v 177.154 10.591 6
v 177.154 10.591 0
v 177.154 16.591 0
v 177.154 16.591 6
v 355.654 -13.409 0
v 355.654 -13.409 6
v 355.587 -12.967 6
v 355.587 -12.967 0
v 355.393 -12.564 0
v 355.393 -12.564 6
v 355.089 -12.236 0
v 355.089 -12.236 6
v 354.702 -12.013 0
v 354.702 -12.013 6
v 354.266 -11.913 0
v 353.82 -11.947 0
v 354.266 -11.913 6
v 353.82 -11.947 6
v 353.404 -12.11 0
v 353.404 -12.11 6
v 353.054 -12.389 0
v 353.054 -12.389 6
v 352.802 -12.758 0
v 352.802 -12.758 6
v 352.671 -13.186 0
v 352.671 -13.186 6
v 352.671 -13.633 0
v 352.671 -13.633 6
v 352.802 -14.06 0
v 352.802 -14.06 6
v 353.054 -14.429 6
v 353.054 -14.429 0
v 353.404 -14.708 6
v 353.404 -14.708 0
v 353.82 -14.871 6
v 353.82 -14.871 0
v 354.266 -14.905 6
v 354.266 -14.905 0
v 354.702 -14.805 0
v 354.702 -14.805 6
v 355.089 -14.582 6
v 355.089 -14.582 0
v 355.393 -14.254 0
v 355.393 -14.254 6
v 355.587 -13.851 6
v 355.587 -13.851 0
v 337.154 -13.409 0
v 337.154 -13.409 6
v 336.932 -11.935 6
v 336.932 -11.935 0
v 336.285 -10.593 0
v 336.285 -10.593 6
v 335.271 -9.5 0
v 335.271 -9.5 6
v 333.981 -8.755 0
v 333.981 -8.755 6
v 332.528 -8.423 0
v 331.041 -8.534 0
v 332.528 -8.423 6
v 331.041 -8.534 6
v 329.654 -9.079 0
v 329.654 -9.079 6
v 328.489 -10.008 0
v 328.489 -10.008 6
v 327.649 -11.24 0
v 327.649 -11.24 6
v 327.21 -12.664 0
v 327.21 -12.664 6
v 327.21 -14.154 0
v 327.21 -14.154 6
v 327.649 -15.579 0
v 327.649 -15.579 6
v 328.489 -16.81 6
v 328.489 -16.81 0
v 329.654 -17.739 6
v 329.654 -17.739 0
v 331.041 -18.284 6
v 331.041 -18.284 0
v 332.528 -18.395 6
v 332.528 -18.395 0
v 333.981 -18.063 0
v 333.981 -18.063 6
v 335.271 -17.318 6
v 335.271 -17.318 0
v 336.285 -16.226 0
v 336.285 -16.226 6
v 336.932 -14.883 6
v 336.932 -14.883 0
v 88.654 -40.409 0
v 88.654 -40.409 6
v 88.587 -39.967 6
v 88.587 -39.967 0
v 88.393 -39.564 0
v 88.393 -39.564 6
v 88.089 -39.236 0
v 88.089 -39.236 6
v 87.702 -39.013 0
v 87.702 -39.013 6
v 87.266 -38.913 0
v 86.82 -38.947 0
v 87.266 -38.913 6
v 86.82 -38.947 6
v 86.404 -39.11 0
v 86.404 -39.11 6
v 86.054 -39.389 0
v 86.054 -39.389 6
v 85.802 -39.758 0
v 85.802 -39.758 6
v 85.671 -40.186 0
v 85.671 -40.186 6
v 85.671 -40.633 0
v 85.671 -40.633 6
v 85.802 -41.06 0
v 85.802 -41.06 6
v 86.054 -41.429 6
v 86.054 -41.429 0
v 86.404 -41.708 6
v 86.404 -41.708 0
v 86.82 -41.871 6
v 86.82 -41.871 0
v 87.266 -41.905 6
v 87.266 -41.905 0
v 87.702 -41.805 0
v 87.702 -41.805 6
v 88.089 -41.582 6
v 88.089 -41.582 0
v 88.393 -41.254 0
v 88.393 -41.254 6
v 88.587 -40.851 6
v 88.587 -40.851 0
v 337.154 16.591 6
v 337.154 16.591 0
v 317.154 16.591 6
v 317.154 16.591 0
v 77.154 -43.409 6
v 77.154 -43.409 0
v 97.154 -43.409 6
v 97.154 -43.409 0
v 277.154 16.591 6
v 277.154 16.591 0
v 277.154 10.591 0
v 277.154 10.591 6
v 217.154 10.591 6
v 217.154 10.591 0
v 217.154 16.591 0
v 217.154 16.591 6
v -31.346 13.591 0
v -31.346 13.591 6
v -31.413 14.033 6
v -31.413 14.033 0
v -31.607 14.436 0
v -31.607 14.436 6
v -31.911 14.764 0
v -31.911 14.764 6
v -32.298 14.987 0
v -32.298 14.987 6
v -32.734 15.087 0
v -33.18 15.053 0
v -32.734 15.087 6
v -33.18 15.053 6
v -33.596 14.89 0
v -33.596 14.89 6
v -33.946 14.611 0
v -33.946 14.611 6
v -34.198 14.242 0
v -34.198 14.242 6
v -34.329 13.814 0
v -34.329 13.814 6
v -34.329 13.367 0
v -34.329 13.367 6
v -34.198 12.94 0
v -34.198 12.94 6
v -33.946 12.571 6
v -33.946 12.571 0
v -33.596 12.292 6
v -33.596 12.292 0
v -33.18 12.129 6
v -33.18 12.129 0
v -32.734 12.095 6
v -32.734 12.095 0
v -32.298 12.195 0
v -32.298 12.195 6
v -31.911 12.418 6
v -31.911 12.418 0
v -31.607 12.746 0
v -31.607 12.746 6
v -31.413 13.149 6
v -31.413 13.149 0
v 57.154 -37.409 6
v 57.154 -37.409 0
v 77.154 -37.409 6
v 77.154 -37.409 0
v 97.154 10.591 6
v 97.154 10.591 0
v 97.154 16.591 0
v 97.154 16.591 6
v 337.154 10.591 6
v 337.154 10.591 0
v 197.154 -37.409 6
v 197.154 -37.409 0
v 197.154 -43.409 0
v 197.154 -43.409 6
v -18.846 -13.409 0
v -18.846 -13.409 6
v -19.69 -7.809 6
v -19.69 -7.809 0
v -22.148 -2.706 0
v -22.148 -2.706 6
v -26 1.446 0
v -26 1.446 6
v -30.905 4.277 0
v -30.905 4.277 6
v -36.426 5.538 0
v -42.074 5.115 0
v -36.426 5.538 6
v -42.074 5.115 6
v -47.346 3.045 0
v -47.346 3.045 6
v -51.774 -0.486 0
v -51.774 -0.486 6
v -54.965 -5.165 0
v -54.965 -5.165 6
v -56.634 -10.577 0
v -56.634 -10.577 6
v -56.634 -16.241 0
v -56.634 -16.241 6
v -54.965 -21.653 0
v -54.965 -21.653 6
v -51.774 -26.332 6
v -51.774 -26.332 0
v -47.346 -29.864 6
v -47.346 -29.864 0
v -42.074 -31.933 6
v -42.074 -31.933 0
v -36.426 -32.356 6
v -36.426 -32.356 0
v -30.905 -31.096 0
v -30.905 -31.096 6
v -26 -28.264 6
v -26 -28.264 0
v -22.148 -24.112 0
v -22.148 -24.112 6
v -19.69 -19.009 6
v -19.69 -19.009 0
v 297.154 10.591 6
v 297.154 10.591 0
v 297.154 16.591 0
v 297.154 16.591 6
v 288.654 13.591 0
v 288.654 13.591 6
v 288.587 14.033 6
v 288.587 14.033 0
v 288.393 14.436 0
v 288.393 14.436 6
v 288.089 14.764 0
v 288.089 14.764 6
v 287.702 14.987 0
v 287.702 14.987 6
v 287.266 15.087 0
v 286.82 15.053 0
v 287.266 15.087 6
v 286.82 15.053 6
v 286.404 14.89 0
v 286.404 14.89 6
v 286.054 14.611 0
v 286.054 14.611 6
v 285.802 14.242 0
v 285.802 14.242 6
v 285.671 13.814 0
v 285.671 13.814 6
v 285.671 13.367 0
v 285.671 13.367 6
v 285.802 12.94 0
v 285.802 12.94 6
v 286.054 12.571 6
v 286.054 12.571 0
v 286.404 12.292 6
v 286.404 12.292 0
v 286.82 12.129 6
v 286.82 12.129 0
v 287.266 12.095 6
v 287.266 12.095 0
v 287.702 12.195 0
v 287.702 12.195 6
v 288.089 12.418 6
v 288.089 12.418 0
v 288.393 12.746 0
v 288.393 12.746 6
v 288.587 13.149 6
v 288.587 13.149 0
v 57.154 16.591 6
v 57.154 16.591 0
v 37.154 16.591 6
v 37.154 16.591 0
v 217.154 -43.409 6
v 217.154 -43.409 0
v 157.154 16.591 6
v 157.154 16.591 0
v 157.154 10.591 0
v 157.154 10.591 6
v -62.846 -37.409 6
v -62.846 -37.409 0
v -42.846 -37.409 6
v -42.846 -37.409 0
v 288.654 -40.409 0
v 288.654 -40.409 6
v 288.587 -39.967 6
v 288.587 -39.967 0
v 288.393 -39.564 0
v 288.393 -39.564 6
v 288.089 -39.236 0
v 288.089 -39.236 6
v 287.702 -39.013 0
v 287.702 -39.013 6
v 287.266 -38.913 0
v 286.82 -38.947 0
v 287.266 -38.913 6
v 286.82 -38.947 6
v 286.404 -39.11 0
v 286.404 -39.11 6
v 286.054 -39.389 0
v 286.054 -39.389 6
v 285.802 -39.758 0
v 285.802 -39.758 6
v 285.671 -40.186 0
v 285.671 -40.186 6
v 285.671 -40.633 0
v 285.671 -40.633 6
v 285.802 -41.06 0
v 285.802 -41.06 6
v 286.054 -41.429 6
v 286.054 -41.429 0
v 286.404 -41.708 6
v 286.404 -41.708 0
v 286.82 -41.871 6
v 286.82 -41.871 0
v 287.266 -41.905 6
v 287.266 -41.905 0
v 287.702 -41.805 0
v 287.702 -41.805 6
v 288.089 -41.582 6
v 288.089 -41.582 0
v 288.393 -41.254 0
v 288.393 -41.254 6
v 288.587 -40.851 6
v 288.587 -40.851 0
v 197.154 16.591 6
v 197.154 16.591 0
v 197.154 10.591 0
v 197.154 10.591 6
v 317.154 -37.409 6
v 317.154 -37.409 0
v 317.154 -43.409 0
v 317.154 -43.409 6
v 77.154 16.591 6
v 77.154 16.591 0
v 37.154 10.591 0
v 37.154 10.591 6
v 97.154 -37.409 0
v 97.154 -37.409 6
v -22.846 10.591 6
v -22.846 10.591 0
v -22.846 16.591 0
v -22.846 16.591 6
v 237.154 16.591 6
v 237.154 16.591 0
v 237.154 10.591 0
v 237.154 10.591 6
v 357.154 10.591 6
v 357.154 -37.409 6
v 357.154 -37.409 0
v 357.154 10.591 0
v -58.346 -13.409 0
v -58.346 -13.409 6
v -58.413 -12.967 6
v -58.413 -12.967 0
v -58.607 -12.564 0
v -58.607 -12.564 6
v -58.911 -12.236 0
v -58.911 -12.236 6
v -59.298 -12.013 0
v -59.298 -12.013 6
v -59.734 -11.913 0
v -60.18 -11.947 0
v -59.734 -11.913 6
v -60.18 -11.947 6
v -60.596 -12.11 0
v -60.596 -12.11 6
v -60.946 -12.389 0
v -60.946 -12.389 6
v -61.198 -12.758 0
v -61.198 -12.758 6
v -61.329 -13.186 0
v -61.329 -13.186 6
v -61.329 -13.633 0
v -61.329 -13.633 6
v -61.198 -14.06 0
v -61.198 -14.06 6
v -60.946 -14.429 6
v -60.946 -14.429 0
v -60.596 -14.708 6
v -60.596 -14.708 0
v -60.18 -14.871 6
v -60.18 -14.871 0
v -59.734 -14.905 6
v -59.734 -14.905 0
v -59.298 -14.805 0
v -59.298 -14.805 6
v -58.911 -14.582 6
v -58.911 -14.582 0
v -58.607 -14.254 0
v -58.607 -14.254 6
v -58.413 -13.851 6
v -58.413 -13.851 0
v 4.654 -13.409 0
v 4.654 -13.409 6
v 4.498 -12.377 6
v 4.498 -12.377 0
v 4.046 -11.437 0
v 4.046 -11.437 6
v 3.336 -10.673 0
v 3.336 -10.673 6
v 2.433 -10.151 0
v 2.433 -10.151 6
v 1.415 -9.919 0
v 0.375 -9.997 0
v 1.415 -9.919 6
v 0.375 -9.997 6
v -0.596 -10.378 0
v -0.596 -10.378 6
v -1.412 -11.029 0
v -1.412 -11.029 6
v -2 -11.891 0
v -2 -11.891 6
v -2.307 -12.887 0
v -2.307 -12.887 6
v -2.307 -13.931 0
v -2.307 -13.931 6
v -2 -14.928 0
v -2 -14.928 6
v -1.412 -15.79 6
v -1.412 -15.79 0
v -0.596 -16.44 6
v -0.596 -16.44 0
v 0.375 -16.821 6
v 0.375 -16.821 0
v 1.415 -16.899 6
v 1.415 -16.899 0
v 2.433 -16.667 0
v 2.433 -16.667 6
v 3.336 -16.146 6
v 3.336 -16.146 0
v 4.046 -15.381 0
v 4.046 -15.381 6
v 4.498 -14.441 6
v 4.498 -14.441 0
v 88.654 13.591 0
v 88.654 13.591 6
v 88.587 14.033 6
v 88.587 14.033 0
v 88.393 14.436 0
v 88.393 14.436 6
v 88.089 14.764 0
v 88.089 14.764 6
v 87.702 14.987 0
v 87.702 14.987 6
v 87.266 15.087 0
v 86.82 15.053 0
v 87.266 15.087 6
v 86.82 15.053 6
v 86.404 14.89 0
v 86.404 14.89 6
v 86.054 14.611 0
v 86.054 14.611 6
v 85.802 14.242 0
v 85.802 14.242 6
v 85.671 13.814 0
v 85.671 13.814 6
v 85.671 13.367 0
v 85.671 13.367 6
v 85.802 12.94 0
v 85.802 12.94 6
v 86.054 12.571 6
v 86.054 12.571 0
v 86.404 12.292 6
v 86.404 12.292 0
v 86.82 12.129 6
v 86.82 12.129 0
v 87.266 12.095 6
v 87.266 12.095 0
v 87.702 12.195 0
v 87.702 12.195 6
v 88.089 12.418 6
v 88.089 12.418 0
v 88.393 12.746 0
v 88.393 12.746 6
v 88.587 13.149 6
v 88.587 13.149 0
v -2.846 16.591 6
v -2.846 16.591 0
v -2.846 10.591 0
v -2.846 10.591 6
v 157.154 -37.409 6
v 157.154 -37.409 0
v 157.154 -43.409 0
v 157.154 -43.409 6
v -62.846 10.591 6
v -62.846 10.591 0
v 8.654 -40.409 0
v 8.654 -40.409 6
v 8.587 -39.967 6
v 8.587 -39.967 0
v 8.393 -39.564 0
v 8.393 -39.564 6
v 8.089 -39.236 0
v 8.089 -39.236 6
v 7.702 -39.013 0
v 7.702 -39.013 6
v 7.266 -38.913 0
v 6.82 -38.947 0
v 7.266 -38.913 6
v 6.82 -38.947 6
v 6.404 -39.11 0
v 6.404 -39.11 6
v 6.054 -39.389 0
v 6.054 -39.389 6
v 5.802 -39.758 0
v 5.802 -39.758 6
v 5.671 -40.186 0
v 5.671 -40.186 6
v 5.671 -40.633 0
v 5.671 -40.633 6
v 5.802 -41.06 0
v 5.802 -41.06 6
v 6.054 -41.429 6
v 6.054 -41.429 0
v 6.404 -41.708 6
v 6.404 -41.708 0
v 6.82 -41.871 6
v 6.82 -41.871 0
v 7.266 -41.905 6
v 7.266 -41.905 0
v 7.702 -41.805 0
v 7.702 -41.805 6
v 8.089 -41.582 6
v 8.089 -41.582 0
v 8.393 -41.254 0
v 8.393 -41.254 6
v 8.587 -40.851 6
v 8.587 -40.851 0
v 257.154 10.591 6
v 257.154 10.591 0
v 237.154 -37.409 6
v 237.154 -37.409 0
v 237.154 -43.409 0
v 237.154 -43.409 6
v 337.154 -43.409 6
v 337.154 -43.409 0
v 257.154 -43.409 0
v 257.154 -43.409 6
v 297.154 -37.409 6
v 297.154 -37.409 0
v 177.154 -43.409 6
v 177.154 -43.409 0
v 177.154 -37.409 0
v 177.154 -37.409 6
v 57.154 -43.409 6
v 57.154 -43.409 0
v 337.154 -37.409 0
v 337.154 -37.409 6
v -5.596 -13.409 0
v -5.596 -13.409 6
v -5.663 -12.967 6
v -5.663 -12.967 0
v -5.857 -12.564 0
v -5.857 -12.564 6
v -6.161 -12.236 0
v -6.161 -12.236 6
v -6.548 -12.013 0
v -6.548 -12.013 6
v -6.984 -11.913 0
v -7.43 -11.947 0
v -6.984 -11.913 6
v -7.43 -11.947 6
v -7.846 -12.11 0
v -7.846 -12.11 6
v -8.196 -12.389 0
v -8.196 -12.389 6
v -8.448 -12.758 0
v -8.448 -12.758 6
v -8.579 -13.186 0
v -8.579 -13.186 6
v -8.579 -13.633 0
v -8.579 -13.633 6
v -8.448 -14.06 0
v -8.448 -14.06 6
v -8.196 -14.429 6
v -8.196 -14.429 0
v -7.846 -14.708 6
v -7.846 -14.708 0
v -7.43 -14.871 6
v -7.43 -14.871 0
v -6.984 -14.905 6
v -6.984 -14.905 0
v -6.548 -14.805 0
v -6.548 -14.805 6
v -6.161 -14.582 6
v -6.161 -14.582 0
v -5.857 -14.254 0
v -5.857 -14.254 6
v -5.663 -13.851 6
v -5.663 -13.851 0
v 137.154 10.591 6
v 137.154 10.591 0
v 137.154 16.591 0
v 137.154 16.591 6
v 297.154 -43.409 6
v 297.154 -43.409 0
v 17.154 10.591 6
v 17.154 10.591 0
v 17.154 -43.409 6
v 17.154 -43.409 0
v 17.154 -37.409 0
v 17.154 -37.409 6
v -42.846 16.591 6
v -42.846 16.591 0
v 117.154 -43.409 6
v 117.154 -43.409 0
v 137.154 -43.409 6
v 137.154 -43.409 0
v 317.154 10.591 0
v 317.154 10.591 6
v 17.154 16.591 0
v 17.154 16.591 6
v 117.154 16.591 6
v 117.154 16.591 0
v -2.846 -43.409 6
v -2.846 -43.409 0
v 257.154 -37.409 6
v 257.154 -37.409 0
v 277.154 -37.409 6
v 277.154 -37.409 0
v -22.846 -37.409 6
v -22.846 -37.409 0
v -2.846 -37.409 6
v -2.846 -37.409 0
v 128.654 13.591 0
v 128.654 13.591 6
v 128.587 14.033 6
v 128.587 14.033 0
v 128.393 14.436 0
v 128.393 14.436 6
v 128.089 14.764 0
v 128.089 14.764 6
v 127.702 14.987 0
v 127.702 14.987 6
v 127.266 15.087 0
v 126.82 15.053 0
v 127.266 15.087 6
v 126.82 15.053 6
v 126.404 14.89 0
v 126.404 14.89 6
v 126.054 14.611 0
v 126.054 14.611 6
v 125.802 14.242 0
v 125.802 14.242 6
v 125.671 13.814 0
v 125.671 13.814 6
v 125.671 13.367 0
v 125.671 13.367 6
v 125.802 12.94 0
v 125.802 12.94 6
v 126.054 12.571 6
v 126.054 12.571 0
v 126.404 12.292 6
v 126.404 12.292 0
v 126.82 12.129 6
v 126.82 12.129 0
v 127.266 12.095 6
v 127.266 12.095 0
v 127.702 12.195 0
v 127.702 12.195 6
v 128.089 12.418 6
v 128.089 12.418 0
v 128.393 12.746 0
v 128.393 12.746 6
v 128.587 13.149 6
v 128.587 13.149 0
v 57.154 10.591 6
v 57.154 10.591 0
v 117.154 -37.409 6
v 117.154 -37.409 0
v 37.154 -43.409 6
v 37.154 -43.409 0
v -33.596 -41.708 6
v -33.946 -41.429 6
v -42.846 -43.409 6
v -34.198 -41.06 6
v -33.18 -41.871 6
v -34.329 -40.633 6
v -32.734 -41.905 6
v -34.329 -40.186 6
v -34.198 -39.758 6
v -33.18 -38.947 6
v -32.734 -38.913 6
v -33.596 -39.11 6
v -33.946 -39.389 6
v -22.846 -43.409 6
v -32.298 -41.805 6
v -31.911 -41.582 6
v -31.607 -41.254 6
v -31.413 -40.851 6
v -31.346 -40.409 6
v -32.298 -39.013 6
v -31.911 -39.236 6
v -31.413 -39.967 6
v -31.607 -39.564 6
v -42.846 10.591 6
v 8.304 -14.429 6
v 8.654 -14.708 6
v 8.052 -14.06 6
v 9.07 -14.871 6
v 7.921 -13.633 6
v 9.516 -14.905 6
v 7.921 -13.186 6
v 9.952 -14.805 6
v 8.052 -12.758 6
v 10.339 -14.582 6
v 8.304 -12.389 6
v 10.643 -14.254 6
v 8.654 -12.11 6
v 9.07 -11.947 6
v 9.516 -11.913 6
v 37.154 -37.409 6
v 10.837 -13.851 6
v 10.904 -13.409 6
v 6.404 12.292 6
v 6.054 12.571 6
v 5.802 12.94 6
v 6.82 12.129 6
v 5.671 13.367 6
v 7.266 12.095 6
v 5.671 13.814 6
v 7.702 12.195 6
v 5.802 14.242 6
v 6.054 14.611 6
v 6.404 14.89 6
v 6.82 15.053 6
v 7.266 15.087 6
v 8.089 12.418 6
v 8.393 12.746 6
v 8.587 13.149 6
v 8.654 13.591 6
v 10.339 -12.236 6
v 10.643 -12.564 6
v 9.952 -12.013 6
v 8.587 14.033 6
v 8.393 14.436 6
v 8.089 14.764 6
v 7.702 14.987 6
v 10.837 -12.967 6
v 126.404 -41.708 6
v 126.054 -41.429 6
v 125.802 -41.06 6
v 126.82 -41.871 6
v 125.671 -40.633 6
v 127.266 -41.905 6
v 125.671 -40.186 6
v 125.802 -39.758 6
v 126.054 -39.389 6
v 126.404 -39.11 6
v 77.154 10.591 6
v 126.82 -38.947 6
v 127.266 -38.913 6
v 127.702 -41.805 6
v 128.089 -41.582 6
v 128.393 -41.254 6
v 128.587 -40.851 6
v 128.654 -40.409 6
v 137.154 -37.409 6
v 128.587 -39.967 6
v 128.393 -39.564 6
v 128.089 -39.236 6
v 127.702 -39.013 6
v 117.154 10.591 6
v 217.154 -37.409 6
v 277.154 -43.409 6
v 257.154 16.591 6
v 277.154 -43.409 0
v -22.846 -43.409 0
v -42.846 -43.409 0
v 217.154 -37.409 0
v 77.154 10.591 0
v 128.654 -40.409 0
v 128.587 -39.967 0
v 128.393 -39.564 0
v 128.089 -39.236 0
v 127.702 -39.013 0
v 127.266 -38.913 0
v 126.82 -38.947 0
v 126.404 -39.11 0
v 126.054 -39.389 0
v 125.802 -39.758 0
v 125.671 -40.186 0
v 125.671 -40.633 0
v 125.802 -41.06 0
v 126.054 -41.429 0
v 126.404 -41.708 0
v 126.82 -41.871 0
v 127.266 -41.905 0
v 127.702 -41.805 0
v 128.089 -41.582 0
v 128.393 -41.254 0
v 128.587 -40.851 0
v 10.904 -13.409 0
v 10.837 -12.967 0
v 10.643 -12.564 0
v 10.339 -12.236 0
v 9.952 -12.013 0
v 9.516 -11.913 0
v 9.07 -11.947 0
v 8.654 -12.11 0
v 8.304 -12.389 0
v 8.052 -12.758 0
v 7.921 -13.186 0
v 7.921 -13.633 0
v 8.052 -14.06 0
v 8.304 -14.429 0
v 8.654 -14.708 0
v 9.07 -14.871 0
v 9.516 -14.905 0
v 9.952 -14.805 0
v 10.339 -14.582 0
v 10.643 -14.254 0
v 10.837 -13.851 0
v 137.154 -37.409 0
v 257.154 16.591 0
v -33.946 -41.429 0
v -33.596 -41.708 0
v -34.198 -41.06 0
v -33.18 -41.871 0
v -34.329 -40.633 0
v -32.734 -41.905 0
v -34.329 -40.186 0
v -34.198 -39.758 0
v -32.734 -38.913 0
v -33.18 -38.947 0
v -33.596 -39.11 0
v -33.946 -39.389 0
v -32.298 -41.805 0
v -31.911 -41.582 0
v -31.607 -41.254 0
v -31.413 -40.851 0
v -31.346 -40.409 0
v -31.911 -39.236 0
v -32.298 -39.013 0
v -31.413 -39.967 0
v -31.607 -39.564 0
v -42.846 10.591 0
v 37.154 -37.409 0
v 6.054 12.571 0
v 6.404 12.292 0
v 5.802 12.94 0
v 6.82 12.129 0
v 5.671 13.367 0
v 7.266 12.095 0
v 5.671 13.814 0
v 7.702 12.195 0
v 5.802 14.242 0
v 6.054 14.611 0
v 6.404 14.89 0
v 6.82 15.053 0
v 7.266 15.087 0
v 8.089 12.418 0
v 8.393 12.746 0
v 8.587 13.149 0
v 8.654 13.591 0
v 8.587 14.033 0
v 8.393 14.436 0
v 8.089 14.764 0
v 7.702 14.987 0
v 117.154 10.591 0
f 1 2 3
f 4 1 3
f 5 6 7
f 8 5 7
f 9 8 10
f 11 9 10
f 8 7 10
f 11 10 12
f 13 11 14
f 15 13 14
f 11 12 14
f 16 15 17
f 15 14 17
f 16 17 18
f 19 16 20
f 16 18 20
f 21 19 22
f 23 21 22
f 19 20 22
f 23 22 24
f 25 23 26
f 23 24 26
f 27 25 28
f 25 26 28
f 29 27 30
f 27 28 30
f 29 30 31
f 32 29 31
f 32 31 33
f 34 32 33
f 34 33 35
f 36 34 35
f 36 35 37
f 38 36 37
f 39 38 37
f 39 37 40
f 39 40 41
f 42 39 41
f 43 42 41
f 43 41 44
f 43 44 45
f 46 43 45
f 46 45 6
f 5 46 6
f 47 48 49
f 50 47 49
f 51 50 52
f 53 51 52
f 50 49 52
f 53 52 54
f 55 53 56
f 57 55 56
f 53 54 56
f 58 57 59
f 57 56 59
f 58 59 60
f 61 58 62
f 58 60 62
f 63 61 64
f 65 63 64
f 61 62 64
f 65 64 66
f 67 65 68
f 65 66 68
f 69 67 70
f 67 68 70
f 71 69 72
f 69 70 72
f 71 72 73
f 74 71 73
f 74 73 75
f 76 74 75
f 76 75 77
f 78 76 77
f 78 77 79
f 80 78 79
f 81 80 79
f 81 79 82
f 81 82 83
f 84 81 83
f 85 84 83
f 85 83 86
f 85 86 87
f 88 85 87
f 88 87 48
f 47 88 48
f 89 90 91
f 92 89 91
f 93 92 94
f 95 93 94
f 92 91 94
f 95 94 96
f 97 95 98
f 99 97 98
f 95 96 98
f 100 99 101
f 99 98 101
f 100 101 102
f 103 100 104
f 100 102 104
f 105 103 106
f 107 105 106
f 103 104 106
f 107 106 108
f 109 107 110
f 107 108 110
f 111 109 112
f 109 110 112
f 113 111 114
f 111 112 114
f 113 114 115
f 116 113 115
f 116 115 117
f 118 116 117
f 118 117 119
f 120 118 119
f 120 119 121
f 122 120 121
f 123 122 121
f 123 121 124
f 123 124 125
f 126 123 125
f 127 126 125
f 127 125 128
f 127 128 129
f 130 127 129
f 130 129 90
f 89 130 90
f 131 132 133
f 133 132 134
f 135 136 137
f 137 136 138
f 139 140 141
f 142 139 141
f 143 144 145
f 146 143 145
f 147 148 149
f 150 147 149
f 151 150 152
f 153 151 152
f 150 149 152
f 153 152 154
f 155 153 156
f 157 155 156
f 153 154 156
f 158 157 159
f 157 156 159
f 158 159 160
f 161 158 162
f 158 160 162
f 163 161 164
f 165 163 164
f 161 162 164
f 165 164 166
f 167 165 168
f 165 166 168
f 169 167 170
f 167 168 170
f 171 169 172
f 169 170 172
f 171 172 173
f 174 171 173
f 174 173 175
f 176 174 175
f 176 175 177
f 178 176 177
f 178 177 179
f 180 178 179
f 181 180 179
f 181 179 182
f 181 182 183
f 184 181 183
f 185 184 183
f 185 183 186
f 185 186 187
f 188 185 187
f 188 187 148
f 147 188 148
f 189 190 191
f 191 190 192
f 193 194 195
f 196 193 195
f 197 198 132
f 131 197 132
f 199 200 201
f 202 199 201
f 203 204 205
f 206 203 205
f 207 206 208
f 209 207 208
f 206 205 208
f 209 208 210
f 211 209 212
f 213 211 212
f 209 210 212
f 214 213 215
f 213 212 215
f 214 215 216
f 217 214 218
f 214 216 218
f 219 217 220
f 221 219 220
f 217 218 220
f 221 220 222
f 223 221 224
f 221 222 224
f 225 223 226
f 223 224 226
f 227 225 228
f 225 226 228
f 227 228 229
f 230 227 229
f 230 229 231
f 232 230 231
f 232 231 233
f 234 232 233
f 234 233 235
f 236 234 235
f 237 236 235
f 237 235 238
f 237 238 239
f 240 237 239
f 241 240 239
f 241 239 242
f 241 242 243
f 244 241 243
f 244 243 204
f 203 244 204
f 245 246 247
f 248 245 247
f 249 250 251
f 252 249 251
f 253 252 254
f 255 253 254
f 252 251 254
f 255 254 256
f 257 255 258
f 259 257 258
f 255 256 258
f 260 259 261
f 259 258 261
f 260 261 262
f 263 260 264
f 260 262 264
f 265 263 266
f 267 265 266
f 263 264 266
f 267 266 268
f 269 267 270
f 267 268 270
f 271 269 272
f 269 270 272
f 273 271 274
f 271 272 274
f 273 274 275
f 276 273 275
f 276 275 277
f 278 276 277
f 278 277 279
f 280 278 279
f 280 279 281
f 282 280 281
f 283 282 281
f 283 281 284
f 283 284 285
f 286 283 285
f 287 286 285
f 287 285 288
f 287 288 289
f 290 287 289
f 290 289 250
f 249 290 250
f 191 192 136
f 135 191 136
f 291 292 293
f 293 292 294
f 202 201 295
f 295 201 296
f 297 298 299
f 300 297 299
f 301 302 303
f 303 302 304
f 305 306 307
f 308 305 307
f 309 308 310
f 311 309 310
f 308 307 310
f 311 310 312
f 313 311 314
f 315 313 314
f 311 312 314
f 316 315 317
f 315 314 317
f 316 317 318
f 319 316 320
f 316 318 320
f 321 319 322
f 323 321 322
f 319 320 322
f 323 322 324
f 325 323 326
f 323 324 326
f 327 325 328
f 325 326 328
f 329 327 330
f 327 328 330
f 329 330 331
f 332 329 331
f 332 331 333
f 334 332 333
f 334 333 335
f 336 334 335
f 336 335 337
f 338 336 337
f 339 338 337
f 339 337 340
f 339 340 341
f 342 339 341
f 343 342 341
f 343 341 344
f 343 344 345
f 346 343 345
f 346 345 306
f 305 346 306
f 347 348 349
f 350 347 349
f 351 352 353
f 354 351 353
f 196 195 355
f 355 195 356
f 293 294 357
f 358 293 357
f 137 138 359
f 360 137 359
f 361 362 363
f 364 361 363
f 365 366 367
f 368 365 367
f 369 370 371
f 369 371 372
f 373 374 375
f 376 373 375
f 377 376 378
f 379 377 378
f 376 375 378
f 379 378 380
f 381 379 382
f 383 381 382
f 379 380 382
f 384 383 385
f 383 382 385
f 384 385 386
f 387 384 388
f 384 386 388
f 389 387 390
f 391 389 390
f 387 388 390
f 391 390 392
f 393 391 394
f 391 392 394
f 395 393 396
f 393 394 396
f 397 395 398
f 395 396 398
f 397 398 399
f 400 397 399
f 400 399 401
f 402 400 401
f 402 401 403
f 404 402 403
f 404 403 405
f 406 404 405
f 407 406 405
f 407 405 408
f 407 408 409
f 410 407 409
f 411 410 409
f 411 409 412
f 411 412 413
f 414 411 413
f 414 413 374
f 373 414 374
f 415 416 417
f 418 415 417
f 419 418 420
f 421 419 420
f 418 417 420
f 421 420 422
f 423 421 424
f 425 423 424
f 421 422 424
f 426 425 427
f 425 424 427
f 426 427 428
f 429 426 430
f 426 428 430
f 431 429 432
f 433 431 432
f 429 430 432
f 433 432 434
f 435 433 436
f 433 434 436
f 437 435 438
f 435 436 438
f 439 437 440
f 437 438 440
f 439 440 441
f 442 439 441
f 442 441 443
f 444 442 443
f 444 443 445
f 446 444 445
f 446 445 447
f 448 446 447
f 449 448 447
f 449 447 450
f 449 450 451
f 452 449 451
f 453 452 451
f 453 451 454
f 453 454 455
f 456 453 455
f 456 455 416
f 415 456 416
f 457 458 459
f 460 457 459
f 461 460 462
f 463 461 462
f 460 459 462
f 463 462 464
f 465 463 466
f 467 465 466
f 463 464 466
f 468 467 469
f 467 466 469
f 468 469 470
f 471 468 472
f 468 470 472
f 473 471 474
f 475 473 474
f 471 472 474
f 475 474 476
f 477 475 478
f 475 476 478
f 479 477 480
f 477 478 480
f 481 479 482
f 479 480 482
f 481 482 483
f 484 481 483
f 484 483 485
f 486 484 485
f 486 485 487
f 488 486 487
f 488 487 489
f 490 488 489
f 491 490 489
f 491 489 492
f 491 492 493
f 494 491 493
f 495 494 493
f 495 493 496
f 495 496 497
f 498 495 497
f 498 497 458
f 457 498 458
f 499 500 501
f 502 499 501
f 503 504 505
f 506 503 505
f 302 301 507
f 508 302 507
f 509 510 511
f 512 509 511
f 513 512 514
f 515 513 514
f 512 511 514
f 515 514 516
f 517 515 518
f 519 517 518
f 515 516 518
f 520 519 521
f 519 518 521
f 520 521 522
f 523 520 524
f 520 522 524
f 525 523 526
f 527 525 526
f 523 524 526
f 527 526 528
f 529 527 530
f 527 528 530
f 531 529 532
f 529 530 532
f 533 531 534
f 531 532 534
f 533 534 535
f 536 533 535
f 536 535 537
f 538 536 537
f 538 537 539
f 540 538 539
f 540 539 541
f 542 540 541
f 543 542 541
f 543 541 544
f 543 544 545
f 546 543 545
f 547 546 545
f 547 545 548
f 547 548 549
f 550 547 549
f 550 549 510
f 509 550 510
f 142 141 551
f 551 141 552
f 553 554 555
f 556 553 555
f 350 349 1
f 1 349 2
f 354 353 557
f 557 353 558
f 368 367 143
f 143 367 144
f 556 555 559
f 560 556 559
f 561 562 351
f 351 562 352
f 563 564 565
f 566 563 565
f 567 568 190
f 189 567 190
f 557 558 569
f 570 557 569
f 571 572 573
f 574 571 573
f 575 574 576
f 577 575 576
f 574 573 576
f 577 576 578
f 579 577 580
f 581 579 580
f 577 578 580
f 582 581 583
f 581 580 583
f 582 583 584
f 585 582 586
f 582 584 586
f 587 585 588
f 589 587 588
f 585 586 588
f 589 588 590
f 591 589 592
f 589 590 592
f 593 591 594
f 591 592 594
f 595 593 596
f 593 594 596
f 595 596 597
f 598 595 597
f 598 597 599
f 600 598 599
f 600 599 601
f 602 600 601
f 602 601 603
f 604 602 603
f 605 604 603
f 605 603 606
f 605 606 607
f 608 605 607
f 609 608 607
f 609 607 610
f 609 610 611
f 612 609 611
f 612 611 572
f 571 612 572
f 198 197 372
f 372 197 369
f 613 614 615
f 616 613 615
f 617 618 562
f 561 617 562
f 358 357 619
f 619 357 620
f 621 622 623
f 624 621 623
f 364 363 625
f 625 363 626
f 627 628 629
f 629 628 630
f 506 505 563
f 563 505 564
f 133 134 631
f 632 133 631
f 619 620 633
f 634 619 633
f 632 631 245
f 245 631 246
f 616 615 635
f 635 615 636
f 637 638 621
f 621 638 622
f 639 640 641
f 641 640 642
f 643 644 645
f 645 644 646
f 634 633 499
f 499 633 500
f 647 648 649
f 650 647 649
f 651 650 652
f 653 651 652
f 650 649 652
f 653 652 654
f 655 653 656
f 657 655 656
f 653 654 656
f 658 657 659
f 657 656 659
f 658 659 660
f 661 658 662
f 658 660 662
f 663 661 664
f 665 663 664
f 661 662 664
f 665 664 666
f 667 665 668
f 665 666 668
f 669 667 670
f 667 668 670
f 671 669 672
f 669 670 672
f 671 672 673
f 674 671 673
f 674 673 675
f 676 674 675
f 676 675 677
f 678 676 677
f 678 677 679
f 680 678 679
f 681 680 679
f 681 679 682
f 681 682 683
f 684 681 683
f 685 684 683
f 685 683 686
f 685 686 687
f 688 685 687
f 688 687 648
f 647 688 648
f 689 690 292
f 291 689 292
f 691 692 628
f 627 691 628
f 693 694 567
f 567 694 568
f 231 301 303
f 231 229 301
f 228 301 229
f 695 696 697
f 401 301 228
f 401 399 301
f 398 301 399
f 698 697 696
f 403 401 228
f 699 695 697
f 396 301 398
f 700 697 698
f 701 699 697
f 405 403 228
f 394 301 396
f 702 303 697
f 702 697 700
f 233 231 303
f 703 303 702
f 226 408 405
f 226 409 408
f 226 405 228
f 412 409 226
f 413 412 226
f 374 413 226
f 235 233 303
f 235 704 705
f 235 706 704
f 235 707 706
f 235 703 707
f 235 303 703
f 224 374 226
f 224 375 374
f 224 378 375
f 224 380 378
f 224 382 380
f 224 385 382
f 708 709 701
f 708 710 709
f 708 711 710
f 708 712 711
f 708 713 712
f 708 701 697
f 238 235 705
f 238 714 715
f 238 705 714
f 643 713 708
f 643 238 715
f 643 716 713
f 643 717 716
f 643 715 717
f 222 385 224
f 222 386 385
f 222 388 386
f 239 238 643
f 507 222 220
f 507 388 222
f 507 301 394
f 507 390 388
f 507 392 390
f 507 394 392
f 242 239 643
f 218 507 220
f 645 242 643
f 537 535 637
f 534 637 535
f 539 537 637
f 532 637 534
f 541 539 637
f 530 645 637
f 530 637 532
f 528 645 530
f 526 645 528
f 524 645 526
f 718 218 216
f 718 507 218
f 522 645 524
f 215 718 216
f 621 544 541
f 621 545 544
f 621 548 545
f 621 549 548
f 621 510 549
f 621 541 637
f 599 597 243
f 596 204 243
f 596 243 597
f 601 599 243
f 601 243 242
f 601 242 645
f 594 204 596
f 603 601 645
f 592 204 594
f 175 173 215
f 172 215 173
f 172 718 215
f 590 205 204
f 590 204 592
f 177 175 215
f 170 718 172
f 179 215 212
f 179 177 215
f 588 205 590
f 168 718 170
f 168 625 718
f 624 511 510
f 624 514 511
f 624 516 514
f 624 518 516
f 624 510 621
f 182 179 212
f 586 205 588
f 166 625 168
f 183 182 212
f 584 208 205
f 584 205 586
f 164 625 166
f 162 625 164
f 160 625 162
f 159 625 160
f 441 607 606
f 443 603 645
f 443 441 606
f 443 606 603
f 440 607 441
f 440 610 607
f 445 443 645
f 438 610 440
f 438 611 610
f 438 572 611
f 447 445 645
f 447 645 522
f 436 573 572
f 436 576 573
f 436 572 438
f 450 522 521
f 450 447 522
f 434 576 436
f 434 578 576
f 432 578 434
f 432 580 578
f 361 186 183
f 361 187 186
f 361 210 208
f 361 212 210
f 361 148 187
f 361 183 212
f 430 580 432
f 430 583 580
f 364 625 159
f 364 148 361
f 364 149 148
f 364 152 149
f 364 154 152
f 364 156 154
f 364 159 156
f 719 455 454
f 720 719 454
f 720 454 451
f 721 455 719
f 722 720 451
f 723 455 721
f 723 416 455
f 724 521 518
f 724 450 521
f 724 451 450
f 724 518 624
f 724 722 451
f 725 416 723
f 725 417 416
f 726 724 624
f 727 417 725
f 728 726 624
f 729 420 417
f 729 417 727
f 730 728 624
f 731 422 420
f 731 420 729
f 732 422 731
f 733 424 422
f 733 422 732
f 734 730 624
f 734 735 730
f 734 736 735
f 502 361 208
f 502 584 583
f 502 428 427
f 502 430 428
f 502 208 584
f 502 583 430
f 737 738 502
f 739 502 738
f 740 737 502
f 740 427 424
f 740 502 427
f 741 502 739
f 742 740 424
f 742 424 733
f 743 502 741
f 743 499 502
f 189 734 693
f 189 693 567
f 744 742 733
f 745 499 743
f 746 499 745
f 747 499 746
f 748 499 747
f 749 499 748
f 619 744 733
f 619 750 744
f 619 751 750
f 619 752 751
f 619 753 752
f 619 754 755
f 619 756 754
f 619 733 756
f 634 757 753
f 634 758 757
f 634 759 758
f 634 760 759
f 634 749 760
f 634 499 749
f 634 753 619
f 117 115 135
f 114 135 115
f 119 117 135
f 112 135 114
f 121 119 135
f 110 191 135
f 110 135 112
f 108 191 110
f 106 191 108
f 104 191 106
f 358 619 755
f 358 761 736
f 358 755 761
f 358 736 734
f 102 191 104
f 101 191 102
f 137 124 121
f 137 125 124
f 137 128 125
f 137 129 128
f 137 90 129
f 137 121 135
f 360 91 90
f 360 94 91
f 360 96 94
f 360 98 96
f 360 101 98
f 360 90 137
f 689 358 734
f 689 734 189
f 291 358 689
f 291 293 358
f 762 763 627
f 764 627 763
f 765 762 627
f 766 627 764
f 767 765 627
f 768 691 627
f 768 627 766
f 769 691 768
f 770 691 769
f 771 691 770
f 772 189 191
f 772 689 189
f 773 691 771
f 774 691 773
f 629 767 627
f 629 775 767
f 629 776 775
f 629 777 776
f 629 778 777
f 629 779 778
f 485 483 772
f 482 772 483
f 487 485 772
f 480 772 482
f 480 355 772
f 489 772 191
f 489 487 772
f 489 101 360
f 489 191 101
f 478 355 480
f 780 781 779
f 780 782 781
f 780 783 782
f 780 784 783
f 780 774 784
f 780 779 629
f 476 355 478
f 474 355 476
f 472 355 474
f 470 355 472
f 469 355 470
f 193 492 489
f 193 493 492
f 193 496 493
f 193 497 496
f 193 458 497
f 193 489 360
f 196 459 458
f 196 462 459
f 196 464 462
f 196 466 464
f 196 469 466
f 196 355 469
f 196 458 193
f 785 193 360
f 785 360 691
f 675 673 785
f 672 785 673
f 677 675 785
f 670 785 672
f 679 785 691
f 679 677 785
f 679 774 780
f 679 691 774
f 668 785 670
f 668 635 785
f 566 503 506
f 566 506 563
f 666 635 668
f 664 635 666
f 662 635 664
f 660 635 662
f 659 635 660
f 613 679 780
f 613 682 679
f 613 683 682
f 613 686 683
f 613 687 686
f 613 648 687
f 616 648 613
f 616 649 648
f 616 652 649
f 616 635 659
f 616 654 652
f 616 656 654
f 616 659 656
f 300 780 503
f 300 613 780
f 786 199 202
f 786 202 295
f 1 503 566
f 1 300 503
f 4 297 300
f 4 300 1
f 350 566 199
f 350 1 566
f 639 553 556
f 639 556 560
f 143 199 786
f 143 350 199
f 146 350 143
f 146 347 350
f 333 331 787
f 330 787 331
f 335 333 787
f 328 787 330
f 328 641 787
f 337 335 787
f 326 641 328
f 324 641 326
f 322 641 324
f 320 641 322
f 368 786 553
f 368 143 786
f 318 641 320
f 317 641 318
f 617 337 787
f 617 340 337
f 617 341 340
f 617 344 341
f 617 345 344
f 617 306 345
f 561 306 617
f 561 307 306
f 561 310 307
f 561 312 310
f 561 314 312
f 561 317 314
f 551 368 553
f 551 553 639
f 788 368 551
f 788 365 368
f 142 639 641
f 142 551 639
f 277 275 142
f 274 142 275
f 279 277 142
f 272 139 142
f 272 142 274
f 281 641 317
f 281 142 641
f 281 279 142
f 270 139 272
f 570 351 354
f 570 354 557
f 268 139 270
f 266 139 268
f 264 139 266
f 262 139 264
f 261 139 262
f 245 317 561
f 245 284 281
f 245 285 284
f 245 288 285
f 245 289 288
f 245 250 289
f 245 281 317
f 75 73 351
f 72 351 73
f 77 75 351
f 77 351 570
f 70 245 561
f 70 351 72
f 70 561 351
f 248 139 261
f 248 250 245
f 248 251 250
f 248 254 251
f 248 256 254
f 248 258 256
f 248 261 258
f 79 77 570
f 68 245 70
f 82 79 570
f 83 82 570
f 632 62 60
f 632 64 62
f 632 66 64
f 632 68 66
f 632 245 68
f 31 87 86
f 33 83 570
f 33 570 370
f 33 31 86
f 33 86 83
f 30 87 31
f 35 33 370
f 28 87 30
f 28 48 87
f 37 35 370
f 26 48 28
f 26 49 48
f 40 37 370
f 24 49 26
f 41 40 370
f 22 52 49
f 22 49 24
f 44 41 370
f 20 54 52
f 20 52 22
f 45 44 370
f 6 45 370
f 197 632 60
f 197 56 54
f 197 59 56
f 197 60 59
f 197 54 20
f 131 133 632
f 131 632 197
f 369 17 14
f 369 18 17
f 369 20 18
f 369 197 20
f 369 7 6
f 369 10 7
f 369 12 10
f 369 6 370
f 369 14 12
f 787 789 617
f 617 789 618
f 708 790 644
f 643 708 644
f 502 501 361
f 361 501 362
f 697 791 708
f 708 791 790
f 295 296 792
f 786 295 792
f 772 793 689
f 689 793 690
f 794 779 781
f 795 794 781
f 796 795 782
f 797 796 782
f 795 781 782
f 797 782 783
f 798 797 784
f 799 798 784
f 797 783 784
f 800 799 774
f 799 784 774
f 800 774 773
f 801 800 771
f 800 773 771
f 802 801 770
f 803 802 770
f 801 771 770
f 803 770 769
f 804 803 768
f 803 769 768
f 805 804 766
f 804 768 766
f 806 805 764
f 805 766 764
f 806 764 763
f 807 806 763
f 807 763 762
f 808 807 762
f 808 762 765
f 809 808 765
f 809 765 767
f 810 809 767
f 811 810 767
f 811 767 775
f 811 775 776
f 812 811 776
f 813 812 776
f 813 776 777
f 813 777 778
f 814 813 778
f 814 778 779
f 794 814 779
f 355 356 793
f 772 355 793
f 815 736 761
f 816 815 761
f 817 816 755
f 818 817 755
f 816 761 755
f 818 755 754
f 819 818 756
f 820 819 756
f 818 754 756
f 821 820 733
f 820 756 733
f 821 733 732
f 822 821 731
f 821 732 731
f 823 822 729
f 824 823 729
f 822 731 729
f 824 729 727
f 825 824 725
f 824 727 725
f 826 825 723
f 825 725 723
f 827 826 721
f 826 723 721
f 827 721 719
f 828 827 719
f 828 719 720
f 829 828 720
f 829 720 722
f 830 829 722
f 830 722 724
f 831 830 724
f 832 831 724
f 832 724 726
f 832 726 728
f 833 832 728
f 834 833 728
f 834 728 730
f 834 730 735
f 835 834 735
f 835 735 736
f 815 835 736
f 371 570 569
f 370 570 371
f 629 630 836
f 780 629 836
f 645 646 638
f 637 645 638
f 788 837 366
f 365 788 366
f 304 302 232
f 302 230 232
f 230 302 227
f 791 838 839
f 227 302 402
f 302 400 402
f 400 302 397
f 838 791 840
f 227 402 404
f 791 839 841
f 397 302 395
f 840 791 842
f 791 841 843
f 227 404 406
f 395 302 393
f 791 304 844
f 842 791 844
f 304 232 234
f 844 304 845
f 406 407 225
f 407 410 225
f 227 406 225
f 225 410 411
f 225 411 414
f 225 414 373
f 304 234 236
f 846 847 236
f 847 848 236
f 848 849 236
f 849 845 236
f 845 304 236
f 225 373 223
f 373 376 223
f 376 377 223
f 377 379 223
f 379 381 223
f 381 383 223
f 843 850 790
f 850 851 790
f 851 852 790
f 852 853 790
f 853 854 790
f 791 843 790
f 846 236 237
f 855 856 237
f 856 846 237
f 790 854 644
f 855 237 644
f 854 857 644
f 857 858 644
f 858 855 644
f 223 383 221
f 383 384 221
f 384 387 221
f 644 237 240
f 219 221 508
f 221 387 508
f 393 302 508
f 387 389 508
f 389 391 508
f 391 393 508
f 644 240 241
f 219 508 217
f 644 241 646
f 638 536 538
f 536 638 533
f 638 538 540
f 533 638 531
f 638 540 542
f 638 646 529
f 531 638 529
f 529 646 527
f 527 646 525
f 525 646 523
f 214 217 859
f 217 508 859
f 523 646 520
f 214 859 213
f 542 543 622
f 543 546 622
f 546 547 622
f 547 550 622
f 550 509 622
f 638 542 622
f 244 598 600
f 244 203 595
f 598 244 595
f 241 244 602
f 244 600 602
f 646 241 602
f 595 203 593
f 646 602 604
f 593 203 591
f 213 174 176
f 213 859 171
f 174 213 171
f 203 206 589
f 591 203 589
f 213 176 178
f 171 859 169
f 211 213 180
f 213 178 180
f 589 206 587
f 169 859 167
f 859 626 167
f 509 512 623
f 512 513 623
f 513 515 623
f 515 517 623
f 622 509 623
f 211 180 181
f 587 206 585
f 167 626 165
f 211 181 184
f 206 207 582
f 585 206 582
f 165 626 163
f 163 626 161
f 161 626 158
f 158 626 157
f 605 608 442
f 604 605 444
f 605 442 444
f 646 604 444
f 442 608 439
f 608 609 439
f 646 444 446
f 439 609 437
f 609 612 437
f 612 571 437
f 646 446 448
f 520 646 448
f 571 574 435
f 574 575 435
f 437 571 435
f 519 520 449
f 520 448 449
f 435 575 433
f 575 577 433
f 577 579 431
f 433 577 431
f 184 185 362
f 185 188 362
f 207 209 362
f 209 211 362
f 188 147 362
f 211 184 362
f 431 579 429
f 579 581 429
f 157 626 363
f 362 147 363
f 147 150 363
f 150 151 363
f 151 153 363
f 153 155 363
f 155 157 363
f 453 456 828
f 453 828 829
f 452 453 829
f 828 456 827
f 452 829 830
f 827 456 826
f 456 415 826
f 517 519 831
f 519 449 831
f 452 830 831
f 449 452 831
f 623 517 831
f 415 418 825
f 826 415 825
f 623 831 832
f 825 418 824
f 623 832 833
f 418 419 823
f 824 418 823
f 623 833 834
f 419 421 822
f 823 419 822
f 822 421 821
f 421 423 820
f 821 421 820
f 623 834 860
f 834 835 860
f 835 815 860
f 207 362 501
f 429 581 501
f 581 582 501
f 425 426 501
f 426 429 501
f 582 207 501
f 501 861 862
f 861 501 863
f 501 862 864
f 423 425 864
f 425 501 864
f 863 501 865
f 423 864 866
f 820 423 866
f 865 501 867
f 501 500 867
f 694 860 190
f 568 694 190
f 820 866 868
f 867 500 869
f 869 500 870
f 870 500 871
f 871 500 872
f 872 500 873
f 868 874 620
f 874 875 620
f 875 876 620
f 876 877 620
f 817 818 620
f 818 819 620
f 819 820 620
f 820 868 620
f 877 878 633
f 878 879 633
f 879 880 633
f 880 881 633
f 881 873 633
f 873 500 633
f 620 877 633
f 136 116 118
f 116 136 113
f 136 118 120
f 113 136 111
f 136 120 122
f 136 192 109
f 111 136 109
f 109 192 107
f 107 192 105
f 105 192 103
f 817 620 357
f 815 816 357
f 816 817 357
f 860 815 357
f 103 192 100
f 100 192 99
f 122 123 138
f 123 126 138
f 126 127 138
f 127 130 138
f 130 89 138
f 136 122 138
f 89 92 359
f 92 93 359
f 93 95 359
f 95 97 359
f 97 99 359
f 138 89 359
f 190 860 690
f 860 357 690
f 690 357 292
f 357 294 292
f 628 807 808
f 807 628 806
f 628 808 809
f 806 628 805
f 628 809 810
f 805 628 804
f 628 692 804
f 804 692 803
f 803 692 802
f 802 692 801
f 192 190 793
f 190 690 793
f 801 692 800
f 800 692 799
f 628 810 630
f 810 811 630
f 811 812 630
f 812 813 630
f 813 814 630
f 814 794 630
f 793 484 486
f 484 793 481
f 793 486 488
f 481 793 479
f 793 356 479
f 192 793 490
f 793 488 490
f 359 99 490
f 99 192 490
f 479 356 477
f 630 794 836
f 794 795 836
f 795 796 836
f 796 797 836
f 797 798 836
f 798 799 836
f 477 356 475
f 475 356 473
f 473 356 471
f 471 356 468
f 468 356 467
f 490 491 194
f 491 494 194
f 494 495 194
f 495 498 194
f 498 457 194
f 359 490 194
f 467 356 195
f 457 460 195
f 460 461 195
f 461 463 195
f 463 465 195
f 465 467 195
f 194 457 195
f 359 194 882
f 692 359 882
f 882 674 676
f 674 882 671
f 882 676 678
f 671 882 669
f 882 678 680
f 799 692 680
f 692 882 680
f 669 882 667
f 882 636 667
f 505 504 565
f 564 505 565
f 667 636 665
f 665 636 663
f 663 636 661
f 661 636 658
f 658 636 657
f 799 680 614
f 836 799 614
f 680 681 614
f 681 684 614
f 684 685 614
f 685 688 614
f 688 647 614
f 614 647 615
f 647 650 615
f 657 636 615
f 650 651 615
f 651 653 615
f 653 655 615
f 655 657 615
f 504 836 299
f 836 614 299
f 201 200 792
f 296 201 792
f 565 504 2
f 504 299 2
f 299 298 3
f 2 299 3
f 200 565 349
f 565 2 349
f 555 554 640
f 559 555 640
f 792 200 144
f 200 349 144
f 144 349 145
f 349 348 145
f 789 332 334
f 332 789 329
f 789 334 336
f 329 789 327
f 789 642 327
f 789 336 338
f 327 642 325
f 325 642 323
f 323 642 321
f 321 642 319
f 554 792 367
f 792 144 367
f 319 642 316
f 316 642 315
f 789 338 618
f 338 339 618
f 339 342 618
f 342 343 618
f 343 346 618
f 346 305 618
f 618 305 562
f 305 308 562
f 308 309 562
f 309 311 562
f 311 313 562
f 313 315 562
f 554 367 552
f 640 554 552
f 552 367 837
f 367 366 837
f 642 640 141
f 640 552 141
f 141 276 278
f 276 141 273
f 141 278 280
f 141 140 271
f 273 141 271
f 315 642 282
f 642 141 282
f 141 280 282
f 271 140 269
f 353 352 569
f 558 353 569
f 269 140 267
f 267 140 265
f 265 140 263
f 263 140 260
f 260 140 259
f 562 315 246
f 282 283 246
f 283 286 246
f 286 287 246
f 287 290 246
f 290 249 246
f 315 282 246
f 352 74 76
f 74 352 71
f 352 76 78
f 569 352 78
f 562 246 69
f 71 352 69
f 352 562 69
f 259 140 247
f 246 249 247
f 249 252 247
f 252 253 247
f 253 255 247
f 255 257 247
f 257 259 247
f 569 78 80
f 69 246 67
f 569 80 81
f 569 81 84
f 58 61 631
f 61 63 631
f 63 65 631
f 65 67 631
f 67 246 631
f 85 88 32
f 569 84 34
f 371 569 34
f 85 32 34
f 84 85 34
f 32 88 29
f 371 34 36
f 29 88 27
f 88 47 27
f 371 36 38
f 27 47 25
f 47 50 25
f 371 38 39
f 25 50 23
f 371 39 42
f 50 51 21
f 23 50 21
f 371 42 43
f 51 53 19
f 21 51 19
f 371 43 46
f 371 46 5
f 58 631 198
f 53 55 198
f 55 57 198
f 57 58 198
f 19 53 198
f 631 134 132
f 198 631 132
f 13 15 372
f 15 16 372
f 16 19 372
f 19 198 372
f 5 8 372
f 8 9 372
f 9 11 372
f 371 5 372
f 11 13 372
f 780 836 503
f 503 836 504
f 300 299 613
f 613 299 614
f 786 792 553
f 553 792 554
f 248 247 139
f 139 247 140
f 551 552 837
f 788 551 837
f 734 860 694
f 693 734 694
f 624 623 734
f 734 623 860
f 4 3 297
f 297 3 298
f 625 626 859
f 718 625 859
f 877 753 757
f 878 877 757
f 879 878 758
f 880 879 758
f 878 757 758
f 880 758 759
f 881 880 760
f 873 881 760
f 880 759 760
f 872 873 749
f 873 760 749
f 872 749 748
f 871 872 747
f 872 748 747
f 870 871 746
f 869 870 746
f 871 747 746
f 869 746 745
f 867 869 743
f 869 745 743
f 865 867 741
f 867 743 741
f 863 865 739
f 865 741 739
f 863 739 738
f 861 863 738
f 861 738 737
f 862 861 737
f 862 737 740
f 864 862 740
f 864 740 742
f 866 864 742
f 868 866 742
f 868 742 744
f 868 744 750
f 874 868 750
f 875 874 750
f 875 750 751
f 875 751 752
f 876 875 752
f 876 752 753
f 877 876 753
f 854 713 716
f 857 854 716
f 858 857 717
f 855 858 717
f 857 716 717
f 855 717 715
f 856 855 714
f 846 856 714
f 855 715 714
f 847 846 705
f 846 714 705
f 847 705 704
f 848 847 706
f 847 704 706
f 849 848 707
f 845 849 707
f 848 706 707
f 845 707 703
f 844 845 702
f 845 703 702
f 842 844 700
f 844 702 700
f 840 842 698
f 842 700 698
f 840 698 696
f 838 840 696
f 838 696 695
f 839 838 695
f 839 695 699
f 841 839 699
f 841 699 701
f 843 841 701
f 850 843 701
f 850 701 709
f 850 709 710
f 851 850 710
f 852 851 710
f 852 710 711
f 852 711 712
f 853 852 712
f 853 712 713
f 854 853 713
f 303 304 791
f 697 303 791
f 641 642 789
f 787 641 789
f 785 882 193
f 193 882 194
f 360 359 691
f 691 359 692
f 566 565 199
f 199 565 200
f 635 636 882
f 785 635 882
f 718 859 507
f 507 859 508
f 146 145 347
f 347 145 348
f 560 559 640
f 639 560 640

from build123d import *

# Parameters (mm, degrees)
BOSS_EXTRU_1_DEPTH      = 6
ESQUISSE3_R             = 19
ENL_V_MAT_EXTRU_1_DEPTH = 10
ESQUISSE4_W             = 20
ESQUISSE4_H             = 60
ENL_V_MAT_EXTRU_2_DEPTH = 10
ESQUISSE5_W             = 20
ESQUISSE5_H             = 48
BOSS_EXTRU_2_DEPTH      = 6
ESQUISSE6_R             = 1.5
ENL_V_MAT_EXTRU_3_DEPTH = 10
ESQUISSE7_R             = 1.5
ENL_V_MAT_EXTRU_4_DEPTH = 10
ESQUISSE8_R             = 1.5
ENL_V_MAT_EXTRU_5_DEPTH = 10
ESQUISSE9_R             = 3.5
ESQUISSE9_R_2           = 1.5
ENL_V_MAT_EXTRU_6_DEPTH = 10
ESQUISSE10_R            = 1.5
ENL_V_MAT_EXTRU_7_DEPTH = 10
ESQUISSE11_R            = 1.5
ENL_V_MAT_EXTRU_8_DEPTH = 10
ESQUISSE13_R            = 5
ENL_V_MAT_EXTRU_9_DEPTH = 10


with BuildPart() as part:
    # Esquisse2 → Boss.-Extru.1 (new body)
    with BuildSketch(Plane.XY):
        Polygon((-82.846139514, -43.409107348), (-62.846139514, -43.409107348), (-62.846139514, -37.409107348), (-42.846139514, -37.409107348), (-42.846139514, -43.409107348), (-22.846139514, -43.409107348), (-22.846139514, -37.409107348), (-2.846139514, -37.409107348), (-2.846139514, -43.409107348), (17.153860486, -43.409107348), (17.153860486, -37.409107348), (37.153860486, -37.409107348), (37.153860486, -43.409107348), (57.153860486, -43.409107348), (57.153860486, -37.409107348), (77.153860486, -37.409107348), (77.153860486, -43.409107348), (97.153860486, -43.409107348), (97.153860486, -37.409107348), (117.153860486, -37.409107348), (117.153860486, -43.409107348), (137.153860486, -43.409107348), (137.153860486, -37.409107348), (157.153860486, -37.409107348), (157.153860486, -43.409107348), (177.153860486, -43.409107348), (177.153860486, -37.409107348), (197.153860486, -37.409107348), (197.153860486, -43.409107348), (217.153860486, -43.409107348), (217.153860486, -37.409107348), (237.153860486, -37.409107348), (237.153860486, -43.409107348), (257.153860486, -43.409107348), (257.153860486, -37.409107348), (277.153860486, -37.409107348), (277.153860486, -43.409107348), (297.153860486, -43.409107348), (297.153860486, -37.409107348), (317.153860486, -37.409107348), (317.153860486, -43.409107348), (337.153860486, -43.409107348), (337.153860486, 16.590892652), (317.153860486, 16.590892652), (317.153860486, 10.590892652), (297.153860486, 10.590892652), (297.153860486, 16.590892652), (277.153860486, 16.590892652), (277.153860486, 10.590892652), (257.153860486, 10.590892652), (257.153860486, 16.590892652), (237.153860486, 16.590892652), (237.153860486, 10.590892652), (217.153860486, 10.590892652), (217.153860486, 16.590892652), (197.153860486, 16.590892652), (197.153860486, 10.590892652), (177.153860486, 10.590892652), (177.153860486, 16.590892652), (157.153860486, 16.590892652), (157.153860486, 10.590892652), (137.153860486, 10.590892652), (137.153860486, 16.590892652), (117.153860486, 16.590892652), (117.153860486, 10.590892652), (97.153860486, 10.590892652), (97.153860486, 16.590892652), (77.153860486, 16.590892652), (77.153860486, 10.590892652), (57.153860486, 10.590892652), (57.153860486, 16.590892652), (37.153860486, 16.590892652), (37.153860486, 10.590892652), (17.153860486, 10.590892652), (17.153860486, 16.590892652), (-2.846139514, 16.590892652), (-2.846139514, 10.590892652), (-22.846139514, 10.590892652), (-22.846139514, 16.590892652), (-42.846139514, 16.590892652), (-42.846139514, 10.590892652), (-62.846139514, 10.590892652), (-62.846139514, 16.590892652), (-82.846139514, 16.590892652), align=None)
    extrude(amount=BOSS_EXTRU_1_DEPTH)

    # Esquisse3 → Enlèv. mat.-Extru.1 (cut)
    with BuildSketch(Plane.XY.offset(6)):
        with Locations((-37.846139514, -13.409107348)):
            Circle(ESQUISSE3_R)
    extrude(amount=-ENL_V_MAT_EXTRU_1_DEPTH, mode=Mode.SUBTRACT)

    # Esquisse4 → Enlèv. mat.-Extru.2 (cut)
    with BuildSketch(Plane.XY.offset(6)):
        with Locations((-72.846139514, -13.409107348)):
            Rectangle(ESQUISSE4_W, ESQUISSE4_H)
    extrude(amount=-ENL_V_MAT_EXTRU_2_DEPTH, mode=Mode.SUBTRACT)

    # Esquisse5 → Boss.-Extru.2 (add)
    with BuildSketch(Plane.XY.offset(6)):
        with Locations((347.153860486, -13.409107348)):
            Rectangle(ESQUISSE5_W, ESQUISSE5_H)
    extrude(amount=-BOSS_EXTRU_2_DEPTH)

    # Esquisse6 → Enlèv. mat.-Extru.3 (cut)
    with BuildSketch(Plane.XY.offset(6)):
        with Locations((127.153860486, -40.409107348)):
            Circle(ESQUISSE6_R)
        with Locations((287.153860486, -40.409107348)):
            Circle(ESQUISSE6_R)
        with Locations((7.153860486, -40.409107348)):
            Circle(ESQUISSE6_R)
        with Locations((7.153860486, 13.590892652)):
            Circle(ESQUISSE6_R)
        with Locations((127.153860486, 13.590892652)):
            Circle(ESQUISSE6_R)
        with Locations((287.153860486, 13.590892652)):
            Circle(ESQUISSE6_R)
    extrude(amount=-ENL_V_MAT_EXTRU_3_DEPTH, mode=Mode.SUBTRACT)

    # Esquisse7 → Enlèv. mat.-Extru.4 (cut)
    with BuildSketch(Plane.XY.offset(6)):
        with Locations((-59.846139514, -13.409107348)):
            Circle(ESQUISSE7_R)
    extrude(amount=-ENL_V_MAT_EXTRU_4_DEPTH, mode=Mode.SUBTRACT)

    # Esquisse8 → Enlèv. mat.-Extru.5 (cut)
    with BuildSketch(Plane.XY.offset(6)):
        with Locations((354.153860486, -13.409107348)):
            Circle(ESQUISSE8_R)
    extrude(amount=-ENL_V_MAT_EXTRU_5_DEPTH, mode=Mode.SUBTRACT)

    # Esquisse9 → Enlèv. mat.-Extru.6 (cut)
    with BuildSketch(Plane.XY.offset(6)):
        with Locations((1.153860486, -13.409107348)):
            Circle(ESQUISSE9_R)
        with Locations((-7.096139514, -13.409107348)):
            Circle(ESQUISSE9_R_2)
        with Locations((9.403860486, -13.409107348)):
            Circle(ESQUISSE9_R_2)
    extrude(amount=-ENL_V_MAT_EXTRU_6_DEPTH, mode=Mode.SUBTRACT)

    # Esquisse10 → Enlèv. mat.-Extru.7 (cut)
    with BuildSketch(Plane.XY.offset(6)):
        with Locations((-32.846139514, 13.590892652)):
            Circle(ESQUISSE10_R)
        with Locations((-32.846139514, -40.409107348)):
            Circle(ESQUISSE10_R)
    extrude(amount=-ENL_V_MAT_EXTRU_7_DEPTH, mode=Mode.SUBTRACT)

    # Esquisse11 → Enlèv. mat.-Extru.8 (cut)
    with BuildSketch(Plane.XY.offset(6)):
        with Locations((87.153860486, 13.590892652)):
            Circle(ESQUISSE11_R)
        with Locations((87.153860486, -40.409107348)):
            Circle(ESQUISSE11_R)
    extrude(amount=-ENL_V_MAT_EXTRU_8_DEPTH, mode=Mode.SUBTRACT)

    # Esquisse13 → Enlèv. mat.-Extru.9 (cut)
    with BuildSketch(Plane.XY.offset(6)):
        with Locations((332.153860486, -13.409107348)):
            Circle(ESQUISSE13_R)
    extrude(amount=-ENL_V_MAT_EXTRU_9_DEPTH, mode=Mode.SUBTRACT)


solid = part.part
